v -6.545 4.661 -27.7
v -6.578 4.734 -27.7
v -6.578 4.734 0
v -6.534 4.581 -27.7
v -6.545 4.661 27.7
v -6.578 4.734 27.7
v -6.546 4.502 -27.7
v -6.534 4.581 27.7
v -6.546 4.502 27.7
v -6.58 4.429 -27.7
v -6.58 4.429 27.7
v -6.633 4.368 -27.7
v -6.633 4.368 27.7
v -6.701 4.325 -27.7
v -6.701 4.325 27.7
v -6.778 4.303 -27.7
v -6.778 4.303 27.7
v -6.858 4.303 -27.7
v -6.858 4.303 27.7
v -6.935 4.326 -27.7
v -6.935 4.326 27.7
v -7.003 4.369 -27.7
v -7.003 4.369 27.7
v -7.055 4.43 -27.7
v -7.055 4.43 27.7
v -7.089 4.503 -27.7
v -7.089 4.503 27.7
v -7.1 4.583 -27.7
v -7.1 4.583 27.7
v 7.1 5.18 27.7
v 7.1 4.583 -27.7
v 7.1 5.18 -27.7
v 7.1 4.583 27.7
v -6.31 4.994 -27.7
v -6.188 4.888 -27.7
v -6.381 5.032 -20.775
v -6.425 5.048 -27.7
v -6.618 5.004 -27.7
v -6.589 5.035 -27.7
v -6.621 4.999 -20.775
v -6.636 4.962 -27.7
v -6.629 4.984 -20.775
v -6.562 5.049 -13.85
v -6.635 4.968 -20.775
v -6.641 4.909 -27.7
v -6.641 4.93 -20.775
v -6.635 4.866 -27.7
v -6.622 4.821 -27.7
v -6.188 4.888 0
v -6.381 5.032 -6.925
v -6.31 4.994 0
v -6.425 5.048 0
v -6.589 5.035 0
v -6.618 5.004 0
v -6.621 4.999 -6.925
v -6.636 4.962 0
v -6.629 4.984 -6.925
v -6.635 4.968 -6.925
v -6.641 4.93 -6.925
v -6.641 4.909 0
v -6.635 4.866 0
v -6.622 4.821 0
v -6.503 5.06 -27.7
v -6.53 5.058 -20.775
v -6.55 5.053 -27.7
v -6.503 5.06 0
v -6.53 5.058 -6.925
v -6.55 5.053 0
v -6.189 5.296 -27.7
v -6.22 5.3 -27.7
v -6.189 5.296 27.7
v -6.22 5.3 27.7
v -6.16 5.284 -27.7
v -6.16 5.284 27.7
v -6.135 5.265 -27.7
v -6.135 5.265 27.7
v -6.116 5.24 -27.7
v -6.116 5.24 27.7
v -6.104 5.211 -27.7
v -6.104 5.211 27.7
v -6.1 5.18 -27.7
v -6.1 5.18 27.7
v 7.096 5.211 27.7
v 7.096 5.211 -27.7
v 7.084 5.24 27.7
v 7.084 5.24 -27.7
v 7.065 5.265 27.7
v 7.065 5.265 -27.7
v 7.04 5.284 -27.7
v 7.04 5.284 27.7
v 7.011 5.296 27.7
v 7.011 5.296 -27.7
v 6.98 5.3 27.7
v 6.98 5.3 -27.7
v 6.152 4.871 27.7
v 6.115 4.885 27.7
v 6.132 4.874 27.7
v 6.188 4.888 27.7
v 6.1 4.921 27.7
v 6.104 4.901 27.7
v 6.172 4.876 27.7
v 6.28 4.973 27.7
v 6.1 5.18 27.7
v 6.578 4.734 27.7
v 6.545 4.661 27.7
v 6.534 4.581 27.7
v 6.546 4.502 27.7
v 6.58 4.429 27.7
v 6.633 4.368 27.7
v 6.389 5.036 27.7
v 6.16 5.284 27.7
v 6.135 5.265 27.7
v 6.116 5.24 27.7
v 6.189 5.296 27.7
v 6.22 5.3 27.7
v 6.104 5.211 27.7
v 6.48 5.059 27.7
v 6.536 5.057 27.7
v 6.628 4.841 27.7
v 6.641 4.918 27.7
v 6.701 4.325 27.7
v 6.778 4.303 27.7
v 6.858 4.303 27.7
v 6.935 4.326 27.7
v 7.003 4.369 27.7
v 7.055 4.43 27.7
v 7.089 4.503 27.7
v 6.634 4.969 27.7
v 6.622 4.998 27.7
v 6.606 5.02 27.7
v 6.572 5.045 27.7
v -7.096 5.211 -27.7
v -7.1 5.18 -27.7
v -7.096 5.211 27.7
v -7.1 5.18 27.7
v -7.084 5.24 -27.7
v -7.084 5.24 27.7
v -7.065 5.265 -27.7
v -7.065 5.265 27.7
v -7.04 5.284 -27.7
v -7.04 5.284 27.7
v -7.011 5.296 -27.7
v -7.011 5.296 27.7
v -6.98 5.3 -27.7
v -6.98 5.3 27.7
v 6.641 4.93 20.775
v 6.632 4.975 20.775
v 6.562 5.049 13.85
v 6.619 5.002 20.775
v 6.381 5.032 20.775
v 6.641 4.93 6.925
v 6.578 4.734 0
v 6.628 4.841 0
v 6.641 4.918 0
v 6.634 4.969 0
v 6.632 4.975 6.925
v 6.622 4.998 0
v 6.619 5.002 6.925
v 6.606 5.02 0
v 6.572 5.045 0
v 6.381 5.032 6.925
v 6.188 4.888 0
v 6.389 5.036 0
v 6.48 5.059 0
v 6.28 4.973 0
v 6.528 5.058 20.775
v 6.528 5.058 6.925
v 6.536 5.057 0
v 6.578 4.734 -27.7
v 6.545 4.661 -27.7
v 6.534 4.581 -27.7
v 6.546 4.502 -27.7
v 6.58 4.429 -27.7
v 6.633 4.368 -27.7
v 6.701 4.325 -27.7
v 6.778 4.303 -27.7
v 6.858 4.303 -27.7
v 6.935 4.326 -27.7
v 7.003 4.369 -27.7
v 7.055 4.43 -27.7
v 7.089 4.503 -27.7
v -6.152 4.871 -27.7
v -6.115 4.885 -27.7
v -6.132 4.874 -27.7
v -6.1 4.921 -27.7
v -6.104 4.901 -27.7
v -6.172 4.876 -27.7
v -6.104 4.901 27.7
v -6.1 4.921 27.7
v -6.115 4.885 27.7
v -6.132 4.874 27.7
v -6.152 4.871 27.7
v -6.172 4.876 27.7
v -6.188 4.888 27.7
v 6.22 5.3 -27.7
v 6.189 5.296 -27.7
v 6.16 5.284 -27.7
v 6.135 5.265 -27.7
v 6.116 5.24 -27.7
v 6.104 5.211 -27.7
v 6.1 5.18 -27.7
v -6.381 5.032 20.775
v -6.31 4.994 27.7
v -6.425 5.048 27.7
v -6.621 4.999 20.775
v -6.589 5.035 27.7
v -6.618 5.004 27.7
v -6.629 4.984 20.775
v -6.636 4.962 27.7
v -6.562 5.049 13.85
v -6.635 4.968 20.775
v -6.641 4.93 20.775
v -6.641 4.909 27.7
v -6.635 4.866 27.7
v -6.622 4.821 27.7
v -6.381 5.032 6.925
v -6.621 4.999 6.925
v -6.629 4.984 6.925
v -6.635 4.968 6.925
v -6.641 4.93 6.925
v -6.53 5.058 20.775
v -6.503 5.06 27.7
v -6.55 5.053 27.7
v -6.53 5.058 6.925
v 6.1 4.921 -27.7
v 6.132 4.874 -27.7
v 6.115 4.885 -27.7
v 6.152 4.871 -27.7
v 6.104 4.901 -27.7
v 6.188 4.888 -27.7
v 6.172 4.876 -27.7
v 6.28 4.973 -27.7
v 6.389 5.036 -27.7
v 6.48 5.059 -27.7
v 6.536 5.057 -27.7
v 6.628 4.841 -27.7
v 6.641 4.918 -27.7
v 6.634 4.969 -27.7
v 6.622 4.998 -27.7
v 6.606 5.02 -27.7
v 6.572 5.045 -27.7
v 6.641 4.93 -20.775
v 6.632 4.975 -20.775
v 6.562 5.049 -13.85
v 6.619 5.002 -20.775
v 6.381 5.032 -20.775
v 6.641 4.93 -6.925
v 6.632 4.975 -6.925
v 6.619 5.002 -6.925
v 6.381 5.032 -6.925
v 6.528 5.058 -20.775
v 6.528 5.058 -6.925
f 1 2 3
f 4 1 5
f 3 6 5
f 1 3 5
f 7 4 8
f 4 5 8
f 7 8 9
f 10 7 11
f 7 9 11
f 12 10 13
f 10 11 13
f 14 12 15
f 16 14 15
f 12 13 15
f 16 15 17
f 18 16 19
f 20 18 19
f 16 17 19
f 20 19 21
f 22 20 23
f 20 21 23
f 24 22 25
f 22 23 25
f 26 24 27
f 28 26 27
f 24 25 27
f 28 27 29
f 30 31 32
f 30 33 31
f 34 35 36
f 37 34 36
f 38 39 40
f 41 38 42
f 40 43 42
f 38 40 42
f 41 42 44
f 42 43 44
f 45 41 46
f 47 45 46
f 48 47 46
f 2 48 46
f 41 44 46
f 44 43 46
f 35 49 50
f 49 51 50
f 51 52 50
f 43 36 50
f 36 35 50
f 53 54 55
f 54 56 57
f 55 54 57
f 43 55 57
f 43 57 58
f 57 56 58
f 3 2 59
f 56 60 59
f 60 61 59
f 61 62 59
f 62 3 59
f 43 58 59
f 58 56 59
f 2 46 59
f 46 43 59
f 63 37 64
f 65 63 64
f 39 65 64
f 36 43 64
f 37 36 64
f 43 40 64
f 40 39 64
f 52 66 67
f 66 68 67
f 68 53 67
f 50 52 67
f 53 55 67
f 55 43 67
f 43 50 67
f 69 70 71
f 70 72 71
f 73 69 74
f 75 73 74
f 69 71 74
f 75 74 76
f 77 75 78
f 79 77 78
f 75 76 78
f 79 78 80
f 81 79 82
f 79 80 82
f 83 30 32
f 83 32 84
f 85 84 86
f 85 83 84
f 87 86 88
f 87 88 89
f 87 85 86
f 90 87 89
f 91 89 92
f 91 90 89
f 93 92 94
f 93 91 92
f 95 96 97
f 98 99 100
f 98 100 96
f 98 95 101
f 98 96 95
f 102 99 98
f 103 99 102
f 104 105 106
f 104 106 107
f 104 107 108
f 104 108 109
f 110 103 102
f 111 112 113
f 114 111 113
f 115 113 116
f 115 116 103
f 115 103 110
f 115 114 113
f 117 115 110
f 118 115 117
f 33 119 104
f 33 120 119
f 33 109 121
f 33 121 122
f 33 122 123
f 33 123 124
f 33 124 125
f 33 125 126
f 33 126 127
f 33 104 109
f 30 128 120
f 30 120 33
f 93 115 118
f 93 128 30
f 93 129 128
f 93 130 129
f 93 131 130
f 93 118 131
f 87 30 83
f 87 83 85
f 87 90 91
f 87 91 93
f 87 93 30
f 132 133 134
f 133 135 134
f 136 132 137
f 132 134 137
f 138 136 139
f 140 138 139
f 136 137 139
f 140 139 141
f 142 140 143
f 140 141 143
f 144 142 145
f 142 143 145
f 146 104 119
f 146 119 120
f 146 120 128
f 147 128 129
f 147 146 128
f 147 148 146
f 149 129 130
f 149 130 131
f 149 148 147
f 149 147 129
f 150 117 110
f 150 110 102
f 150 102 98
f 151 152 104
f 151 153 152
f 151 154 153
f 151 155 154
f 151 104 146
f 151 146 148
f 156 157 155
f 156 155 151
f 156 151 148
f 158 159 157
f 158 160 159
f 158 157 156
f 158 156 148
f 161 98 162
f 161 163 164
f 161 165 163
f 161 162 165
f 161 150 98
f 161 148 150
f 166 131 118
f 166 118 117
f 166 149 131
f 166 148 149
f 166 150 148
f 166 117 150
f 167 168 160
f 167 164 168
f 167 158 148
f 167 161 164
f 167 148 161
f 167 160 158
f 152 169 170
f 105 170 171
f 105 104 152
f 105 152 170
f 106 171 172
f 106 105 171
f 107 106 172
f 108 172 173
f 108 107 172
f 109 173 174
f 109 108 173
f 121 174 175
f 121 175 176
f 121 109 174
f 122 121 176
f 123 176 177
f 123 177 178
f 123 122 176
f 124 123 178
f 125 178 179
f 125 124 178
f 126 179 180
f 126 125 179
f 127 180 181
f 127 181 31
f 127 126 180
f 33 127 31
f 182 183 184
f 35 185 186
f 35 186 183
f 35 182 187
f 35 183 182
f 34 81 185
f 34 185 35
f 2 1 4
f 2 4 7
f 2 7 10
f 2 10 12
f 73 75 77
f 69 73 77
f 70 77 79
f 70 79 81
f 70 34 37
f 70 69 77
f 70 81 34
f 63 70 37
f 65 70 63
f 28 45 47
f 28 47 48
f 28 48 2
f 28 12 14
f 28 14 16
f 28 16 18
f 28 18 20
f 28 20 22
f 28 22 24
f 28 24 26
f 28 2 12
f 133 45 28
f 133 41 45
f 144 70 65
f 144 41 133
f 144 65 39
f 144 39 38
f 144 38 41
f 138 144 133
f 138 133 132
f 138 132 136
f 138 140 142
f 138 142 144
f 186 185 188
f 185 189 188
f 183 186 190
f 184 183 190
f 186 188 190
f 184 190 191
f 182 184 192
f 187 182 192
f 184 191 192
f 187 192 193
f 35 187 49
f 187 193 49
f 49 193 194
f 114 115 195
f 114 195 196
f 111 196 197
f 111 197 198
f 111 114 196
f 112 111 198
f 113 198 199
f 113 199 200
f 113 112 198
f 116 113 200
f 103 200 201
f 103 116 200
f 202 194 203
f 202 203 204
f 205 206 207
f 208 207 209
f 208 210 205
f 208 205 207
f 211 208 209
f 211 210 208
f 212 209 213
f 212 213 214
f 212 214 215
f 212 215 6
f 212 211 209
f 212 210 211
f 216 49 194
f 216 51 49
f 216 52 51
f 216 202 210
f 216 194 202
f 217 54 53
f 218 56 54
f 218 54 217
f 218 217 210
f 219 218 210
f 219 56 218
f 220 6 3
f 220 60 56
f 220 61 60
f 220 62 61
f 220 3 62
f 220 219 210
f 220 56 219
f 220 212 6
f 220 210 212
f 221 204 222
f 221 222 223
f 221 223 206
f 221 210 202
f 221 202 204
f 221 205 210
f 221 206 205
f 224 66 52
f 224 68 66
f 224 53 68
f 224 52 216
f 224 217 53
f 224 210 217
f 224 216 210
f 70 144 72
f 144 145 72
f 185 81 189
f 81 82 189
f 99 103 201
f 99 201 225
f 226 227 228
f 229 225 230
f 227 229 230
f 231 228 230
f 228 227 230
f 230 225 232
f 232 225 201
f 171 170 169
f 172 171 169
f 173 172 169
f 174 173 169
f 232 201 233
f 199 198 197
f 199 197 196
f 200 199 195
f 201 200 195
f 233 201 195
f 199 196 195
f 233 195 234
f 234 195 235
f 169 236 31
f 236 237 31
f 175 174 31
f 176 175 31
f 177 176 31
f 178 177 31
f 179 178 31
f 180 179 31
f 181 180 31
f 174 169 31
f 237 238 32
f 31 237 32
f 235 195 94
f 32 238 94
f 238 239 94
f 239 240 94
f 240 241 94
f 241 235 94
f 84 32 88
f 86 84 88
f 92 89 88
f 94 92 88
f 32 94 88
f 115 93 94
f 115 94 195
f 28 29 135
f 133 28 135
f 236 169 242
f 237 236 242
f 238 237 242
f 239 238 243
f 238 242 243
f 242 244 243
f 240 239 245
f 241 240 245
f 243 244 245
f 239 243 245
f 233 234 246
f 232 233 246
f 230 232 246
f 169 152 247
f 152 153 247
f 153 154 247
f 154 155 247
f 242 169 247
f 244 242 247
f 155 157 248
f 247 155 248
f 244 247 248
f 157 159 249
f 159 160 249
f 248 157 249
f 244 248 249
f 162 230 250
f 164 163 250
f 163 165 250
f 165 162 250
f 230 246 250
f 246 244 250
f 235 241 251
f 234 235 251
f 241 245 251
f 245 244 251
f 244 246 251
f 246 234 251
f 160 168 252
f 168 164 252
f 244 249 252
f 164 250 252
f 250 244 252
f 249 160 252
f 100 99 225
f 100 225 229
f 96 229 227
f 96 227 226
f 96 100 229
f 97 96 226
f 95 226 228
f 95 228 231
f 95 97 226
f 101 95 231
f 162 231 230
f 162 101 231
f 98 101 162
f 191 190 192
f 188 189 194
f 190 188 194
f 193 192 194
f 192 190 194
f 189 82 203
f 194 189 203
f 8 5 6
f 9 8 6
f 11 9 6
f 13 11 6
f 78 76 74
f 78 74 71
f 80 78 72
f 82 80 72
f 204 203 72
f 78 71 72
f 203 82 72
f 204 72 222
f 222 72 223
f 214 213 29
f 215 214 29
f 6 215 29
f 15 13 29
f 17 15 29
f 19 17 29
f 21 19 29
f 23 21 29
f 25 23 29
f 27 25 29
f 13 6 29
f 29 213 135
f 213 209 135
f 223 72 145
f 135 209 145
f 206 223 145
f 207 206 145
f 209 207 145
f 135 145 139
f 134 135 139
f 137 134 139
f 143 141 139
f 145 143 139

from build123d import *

# Parameters (mm, degrees)
TINY_RED_DEPTH   = 27.7
TINY_RED_2_DEPTH = 27.7


with BuildPart() as part:
    # Tiny Red Profile → Tiny Red (new body, symmetric)
    with BuildSketch(Plane.XY):
        with BuildLine():
            Line((-7.1, 4.582842712), (-7.1, 5.18))
            ThreePointArc((-7.1, 5.18), (-7.064852814, 5.264852814), (-6.98, 5.3))
            Line((-6.98, 5.3), (-6.22, 5.3))
            ThreePointArc((-6.22, 5.3), (-6.135147186, 5.264852814), (-6.1, 5.18))
            Line((-6.1, 5.18), (-6.1, 4.920710678))
            ThreePointArc((-6.1, 4.920710678), (-6.13236303, 4.873924598), (-6.187557492, 4.887704091))
            add(Edge.make_bspline(
                [(-6.187557492, 4.887704091), (-6.389214842, 5.117165695), (-6.561872943, 5.049237628), (-6.734531044, 4.981309562), (-6.578122573, 4.734045904)],
                knots=[1.458408765, 1.458408765, 1.458408765, 2.897791101, 2.897791101, 4.337173437, 4.337173437, 4.337173437], degree=2, weights=[1, 0.752009332, 1, 0.752009332, 1]))
            ThreePointArc((-6.578122573, 4.734045904), (-6.73844651, 4.311172667), (-7.1, 4.582842712))
        make_face()
    extrude(amount=TINY_RED_DEPTH, both=True)


with BuildPart() as body_2:
    # Tiny Red Profile → Tiny Red 2 (new body, symmetric)
    with BuildSketch(Plane.XY):
        with BuildLine():
            Line((7.1, 4.582842712), (7.1, 5.18))
            ThreePointArc((7.1, 5.18), (7.064852814, 5.264852814), (6.98, 5.3))
            Line((6.98, 5.3), (6.22, 5.3))
            ThreePointArc((6.22, 5.3), (6.135147186, 5.264852814), (6.1, 5.18))
            Line((6.1, 5.18), (6.1, 4.920710678))
            ThreePointArc((6.1, 4.920710678), (6.13236303, 4.873924598), (6.187557492, 4.887704091))
            add(Edge.make_bspline(
                [(6.578122573, 4.734045904), (6.734531044, 4.981309562), (6.561872943, 5.049237628), (6.389214842, 5.117165695), (6.187557492, 4.887704091)],
                knots=[1.946011871, 1.946011871, 1.946011871, 3.385394206, 3.385394206, 4.824776542, 4.824776542, 4.824776542], degree=2, weights=[1, 0.752009332, 1, 0.752009332, 1]))
            ThreePointArc((6.578122573, 4.734045904), (6.73844651, 4.311172667), (7.1, 4.582842712))
        make_face()
    extrude(amount=TINY_RED_2_DEPTH, both=True)


solid = Compound([part.part, body_2.part])
